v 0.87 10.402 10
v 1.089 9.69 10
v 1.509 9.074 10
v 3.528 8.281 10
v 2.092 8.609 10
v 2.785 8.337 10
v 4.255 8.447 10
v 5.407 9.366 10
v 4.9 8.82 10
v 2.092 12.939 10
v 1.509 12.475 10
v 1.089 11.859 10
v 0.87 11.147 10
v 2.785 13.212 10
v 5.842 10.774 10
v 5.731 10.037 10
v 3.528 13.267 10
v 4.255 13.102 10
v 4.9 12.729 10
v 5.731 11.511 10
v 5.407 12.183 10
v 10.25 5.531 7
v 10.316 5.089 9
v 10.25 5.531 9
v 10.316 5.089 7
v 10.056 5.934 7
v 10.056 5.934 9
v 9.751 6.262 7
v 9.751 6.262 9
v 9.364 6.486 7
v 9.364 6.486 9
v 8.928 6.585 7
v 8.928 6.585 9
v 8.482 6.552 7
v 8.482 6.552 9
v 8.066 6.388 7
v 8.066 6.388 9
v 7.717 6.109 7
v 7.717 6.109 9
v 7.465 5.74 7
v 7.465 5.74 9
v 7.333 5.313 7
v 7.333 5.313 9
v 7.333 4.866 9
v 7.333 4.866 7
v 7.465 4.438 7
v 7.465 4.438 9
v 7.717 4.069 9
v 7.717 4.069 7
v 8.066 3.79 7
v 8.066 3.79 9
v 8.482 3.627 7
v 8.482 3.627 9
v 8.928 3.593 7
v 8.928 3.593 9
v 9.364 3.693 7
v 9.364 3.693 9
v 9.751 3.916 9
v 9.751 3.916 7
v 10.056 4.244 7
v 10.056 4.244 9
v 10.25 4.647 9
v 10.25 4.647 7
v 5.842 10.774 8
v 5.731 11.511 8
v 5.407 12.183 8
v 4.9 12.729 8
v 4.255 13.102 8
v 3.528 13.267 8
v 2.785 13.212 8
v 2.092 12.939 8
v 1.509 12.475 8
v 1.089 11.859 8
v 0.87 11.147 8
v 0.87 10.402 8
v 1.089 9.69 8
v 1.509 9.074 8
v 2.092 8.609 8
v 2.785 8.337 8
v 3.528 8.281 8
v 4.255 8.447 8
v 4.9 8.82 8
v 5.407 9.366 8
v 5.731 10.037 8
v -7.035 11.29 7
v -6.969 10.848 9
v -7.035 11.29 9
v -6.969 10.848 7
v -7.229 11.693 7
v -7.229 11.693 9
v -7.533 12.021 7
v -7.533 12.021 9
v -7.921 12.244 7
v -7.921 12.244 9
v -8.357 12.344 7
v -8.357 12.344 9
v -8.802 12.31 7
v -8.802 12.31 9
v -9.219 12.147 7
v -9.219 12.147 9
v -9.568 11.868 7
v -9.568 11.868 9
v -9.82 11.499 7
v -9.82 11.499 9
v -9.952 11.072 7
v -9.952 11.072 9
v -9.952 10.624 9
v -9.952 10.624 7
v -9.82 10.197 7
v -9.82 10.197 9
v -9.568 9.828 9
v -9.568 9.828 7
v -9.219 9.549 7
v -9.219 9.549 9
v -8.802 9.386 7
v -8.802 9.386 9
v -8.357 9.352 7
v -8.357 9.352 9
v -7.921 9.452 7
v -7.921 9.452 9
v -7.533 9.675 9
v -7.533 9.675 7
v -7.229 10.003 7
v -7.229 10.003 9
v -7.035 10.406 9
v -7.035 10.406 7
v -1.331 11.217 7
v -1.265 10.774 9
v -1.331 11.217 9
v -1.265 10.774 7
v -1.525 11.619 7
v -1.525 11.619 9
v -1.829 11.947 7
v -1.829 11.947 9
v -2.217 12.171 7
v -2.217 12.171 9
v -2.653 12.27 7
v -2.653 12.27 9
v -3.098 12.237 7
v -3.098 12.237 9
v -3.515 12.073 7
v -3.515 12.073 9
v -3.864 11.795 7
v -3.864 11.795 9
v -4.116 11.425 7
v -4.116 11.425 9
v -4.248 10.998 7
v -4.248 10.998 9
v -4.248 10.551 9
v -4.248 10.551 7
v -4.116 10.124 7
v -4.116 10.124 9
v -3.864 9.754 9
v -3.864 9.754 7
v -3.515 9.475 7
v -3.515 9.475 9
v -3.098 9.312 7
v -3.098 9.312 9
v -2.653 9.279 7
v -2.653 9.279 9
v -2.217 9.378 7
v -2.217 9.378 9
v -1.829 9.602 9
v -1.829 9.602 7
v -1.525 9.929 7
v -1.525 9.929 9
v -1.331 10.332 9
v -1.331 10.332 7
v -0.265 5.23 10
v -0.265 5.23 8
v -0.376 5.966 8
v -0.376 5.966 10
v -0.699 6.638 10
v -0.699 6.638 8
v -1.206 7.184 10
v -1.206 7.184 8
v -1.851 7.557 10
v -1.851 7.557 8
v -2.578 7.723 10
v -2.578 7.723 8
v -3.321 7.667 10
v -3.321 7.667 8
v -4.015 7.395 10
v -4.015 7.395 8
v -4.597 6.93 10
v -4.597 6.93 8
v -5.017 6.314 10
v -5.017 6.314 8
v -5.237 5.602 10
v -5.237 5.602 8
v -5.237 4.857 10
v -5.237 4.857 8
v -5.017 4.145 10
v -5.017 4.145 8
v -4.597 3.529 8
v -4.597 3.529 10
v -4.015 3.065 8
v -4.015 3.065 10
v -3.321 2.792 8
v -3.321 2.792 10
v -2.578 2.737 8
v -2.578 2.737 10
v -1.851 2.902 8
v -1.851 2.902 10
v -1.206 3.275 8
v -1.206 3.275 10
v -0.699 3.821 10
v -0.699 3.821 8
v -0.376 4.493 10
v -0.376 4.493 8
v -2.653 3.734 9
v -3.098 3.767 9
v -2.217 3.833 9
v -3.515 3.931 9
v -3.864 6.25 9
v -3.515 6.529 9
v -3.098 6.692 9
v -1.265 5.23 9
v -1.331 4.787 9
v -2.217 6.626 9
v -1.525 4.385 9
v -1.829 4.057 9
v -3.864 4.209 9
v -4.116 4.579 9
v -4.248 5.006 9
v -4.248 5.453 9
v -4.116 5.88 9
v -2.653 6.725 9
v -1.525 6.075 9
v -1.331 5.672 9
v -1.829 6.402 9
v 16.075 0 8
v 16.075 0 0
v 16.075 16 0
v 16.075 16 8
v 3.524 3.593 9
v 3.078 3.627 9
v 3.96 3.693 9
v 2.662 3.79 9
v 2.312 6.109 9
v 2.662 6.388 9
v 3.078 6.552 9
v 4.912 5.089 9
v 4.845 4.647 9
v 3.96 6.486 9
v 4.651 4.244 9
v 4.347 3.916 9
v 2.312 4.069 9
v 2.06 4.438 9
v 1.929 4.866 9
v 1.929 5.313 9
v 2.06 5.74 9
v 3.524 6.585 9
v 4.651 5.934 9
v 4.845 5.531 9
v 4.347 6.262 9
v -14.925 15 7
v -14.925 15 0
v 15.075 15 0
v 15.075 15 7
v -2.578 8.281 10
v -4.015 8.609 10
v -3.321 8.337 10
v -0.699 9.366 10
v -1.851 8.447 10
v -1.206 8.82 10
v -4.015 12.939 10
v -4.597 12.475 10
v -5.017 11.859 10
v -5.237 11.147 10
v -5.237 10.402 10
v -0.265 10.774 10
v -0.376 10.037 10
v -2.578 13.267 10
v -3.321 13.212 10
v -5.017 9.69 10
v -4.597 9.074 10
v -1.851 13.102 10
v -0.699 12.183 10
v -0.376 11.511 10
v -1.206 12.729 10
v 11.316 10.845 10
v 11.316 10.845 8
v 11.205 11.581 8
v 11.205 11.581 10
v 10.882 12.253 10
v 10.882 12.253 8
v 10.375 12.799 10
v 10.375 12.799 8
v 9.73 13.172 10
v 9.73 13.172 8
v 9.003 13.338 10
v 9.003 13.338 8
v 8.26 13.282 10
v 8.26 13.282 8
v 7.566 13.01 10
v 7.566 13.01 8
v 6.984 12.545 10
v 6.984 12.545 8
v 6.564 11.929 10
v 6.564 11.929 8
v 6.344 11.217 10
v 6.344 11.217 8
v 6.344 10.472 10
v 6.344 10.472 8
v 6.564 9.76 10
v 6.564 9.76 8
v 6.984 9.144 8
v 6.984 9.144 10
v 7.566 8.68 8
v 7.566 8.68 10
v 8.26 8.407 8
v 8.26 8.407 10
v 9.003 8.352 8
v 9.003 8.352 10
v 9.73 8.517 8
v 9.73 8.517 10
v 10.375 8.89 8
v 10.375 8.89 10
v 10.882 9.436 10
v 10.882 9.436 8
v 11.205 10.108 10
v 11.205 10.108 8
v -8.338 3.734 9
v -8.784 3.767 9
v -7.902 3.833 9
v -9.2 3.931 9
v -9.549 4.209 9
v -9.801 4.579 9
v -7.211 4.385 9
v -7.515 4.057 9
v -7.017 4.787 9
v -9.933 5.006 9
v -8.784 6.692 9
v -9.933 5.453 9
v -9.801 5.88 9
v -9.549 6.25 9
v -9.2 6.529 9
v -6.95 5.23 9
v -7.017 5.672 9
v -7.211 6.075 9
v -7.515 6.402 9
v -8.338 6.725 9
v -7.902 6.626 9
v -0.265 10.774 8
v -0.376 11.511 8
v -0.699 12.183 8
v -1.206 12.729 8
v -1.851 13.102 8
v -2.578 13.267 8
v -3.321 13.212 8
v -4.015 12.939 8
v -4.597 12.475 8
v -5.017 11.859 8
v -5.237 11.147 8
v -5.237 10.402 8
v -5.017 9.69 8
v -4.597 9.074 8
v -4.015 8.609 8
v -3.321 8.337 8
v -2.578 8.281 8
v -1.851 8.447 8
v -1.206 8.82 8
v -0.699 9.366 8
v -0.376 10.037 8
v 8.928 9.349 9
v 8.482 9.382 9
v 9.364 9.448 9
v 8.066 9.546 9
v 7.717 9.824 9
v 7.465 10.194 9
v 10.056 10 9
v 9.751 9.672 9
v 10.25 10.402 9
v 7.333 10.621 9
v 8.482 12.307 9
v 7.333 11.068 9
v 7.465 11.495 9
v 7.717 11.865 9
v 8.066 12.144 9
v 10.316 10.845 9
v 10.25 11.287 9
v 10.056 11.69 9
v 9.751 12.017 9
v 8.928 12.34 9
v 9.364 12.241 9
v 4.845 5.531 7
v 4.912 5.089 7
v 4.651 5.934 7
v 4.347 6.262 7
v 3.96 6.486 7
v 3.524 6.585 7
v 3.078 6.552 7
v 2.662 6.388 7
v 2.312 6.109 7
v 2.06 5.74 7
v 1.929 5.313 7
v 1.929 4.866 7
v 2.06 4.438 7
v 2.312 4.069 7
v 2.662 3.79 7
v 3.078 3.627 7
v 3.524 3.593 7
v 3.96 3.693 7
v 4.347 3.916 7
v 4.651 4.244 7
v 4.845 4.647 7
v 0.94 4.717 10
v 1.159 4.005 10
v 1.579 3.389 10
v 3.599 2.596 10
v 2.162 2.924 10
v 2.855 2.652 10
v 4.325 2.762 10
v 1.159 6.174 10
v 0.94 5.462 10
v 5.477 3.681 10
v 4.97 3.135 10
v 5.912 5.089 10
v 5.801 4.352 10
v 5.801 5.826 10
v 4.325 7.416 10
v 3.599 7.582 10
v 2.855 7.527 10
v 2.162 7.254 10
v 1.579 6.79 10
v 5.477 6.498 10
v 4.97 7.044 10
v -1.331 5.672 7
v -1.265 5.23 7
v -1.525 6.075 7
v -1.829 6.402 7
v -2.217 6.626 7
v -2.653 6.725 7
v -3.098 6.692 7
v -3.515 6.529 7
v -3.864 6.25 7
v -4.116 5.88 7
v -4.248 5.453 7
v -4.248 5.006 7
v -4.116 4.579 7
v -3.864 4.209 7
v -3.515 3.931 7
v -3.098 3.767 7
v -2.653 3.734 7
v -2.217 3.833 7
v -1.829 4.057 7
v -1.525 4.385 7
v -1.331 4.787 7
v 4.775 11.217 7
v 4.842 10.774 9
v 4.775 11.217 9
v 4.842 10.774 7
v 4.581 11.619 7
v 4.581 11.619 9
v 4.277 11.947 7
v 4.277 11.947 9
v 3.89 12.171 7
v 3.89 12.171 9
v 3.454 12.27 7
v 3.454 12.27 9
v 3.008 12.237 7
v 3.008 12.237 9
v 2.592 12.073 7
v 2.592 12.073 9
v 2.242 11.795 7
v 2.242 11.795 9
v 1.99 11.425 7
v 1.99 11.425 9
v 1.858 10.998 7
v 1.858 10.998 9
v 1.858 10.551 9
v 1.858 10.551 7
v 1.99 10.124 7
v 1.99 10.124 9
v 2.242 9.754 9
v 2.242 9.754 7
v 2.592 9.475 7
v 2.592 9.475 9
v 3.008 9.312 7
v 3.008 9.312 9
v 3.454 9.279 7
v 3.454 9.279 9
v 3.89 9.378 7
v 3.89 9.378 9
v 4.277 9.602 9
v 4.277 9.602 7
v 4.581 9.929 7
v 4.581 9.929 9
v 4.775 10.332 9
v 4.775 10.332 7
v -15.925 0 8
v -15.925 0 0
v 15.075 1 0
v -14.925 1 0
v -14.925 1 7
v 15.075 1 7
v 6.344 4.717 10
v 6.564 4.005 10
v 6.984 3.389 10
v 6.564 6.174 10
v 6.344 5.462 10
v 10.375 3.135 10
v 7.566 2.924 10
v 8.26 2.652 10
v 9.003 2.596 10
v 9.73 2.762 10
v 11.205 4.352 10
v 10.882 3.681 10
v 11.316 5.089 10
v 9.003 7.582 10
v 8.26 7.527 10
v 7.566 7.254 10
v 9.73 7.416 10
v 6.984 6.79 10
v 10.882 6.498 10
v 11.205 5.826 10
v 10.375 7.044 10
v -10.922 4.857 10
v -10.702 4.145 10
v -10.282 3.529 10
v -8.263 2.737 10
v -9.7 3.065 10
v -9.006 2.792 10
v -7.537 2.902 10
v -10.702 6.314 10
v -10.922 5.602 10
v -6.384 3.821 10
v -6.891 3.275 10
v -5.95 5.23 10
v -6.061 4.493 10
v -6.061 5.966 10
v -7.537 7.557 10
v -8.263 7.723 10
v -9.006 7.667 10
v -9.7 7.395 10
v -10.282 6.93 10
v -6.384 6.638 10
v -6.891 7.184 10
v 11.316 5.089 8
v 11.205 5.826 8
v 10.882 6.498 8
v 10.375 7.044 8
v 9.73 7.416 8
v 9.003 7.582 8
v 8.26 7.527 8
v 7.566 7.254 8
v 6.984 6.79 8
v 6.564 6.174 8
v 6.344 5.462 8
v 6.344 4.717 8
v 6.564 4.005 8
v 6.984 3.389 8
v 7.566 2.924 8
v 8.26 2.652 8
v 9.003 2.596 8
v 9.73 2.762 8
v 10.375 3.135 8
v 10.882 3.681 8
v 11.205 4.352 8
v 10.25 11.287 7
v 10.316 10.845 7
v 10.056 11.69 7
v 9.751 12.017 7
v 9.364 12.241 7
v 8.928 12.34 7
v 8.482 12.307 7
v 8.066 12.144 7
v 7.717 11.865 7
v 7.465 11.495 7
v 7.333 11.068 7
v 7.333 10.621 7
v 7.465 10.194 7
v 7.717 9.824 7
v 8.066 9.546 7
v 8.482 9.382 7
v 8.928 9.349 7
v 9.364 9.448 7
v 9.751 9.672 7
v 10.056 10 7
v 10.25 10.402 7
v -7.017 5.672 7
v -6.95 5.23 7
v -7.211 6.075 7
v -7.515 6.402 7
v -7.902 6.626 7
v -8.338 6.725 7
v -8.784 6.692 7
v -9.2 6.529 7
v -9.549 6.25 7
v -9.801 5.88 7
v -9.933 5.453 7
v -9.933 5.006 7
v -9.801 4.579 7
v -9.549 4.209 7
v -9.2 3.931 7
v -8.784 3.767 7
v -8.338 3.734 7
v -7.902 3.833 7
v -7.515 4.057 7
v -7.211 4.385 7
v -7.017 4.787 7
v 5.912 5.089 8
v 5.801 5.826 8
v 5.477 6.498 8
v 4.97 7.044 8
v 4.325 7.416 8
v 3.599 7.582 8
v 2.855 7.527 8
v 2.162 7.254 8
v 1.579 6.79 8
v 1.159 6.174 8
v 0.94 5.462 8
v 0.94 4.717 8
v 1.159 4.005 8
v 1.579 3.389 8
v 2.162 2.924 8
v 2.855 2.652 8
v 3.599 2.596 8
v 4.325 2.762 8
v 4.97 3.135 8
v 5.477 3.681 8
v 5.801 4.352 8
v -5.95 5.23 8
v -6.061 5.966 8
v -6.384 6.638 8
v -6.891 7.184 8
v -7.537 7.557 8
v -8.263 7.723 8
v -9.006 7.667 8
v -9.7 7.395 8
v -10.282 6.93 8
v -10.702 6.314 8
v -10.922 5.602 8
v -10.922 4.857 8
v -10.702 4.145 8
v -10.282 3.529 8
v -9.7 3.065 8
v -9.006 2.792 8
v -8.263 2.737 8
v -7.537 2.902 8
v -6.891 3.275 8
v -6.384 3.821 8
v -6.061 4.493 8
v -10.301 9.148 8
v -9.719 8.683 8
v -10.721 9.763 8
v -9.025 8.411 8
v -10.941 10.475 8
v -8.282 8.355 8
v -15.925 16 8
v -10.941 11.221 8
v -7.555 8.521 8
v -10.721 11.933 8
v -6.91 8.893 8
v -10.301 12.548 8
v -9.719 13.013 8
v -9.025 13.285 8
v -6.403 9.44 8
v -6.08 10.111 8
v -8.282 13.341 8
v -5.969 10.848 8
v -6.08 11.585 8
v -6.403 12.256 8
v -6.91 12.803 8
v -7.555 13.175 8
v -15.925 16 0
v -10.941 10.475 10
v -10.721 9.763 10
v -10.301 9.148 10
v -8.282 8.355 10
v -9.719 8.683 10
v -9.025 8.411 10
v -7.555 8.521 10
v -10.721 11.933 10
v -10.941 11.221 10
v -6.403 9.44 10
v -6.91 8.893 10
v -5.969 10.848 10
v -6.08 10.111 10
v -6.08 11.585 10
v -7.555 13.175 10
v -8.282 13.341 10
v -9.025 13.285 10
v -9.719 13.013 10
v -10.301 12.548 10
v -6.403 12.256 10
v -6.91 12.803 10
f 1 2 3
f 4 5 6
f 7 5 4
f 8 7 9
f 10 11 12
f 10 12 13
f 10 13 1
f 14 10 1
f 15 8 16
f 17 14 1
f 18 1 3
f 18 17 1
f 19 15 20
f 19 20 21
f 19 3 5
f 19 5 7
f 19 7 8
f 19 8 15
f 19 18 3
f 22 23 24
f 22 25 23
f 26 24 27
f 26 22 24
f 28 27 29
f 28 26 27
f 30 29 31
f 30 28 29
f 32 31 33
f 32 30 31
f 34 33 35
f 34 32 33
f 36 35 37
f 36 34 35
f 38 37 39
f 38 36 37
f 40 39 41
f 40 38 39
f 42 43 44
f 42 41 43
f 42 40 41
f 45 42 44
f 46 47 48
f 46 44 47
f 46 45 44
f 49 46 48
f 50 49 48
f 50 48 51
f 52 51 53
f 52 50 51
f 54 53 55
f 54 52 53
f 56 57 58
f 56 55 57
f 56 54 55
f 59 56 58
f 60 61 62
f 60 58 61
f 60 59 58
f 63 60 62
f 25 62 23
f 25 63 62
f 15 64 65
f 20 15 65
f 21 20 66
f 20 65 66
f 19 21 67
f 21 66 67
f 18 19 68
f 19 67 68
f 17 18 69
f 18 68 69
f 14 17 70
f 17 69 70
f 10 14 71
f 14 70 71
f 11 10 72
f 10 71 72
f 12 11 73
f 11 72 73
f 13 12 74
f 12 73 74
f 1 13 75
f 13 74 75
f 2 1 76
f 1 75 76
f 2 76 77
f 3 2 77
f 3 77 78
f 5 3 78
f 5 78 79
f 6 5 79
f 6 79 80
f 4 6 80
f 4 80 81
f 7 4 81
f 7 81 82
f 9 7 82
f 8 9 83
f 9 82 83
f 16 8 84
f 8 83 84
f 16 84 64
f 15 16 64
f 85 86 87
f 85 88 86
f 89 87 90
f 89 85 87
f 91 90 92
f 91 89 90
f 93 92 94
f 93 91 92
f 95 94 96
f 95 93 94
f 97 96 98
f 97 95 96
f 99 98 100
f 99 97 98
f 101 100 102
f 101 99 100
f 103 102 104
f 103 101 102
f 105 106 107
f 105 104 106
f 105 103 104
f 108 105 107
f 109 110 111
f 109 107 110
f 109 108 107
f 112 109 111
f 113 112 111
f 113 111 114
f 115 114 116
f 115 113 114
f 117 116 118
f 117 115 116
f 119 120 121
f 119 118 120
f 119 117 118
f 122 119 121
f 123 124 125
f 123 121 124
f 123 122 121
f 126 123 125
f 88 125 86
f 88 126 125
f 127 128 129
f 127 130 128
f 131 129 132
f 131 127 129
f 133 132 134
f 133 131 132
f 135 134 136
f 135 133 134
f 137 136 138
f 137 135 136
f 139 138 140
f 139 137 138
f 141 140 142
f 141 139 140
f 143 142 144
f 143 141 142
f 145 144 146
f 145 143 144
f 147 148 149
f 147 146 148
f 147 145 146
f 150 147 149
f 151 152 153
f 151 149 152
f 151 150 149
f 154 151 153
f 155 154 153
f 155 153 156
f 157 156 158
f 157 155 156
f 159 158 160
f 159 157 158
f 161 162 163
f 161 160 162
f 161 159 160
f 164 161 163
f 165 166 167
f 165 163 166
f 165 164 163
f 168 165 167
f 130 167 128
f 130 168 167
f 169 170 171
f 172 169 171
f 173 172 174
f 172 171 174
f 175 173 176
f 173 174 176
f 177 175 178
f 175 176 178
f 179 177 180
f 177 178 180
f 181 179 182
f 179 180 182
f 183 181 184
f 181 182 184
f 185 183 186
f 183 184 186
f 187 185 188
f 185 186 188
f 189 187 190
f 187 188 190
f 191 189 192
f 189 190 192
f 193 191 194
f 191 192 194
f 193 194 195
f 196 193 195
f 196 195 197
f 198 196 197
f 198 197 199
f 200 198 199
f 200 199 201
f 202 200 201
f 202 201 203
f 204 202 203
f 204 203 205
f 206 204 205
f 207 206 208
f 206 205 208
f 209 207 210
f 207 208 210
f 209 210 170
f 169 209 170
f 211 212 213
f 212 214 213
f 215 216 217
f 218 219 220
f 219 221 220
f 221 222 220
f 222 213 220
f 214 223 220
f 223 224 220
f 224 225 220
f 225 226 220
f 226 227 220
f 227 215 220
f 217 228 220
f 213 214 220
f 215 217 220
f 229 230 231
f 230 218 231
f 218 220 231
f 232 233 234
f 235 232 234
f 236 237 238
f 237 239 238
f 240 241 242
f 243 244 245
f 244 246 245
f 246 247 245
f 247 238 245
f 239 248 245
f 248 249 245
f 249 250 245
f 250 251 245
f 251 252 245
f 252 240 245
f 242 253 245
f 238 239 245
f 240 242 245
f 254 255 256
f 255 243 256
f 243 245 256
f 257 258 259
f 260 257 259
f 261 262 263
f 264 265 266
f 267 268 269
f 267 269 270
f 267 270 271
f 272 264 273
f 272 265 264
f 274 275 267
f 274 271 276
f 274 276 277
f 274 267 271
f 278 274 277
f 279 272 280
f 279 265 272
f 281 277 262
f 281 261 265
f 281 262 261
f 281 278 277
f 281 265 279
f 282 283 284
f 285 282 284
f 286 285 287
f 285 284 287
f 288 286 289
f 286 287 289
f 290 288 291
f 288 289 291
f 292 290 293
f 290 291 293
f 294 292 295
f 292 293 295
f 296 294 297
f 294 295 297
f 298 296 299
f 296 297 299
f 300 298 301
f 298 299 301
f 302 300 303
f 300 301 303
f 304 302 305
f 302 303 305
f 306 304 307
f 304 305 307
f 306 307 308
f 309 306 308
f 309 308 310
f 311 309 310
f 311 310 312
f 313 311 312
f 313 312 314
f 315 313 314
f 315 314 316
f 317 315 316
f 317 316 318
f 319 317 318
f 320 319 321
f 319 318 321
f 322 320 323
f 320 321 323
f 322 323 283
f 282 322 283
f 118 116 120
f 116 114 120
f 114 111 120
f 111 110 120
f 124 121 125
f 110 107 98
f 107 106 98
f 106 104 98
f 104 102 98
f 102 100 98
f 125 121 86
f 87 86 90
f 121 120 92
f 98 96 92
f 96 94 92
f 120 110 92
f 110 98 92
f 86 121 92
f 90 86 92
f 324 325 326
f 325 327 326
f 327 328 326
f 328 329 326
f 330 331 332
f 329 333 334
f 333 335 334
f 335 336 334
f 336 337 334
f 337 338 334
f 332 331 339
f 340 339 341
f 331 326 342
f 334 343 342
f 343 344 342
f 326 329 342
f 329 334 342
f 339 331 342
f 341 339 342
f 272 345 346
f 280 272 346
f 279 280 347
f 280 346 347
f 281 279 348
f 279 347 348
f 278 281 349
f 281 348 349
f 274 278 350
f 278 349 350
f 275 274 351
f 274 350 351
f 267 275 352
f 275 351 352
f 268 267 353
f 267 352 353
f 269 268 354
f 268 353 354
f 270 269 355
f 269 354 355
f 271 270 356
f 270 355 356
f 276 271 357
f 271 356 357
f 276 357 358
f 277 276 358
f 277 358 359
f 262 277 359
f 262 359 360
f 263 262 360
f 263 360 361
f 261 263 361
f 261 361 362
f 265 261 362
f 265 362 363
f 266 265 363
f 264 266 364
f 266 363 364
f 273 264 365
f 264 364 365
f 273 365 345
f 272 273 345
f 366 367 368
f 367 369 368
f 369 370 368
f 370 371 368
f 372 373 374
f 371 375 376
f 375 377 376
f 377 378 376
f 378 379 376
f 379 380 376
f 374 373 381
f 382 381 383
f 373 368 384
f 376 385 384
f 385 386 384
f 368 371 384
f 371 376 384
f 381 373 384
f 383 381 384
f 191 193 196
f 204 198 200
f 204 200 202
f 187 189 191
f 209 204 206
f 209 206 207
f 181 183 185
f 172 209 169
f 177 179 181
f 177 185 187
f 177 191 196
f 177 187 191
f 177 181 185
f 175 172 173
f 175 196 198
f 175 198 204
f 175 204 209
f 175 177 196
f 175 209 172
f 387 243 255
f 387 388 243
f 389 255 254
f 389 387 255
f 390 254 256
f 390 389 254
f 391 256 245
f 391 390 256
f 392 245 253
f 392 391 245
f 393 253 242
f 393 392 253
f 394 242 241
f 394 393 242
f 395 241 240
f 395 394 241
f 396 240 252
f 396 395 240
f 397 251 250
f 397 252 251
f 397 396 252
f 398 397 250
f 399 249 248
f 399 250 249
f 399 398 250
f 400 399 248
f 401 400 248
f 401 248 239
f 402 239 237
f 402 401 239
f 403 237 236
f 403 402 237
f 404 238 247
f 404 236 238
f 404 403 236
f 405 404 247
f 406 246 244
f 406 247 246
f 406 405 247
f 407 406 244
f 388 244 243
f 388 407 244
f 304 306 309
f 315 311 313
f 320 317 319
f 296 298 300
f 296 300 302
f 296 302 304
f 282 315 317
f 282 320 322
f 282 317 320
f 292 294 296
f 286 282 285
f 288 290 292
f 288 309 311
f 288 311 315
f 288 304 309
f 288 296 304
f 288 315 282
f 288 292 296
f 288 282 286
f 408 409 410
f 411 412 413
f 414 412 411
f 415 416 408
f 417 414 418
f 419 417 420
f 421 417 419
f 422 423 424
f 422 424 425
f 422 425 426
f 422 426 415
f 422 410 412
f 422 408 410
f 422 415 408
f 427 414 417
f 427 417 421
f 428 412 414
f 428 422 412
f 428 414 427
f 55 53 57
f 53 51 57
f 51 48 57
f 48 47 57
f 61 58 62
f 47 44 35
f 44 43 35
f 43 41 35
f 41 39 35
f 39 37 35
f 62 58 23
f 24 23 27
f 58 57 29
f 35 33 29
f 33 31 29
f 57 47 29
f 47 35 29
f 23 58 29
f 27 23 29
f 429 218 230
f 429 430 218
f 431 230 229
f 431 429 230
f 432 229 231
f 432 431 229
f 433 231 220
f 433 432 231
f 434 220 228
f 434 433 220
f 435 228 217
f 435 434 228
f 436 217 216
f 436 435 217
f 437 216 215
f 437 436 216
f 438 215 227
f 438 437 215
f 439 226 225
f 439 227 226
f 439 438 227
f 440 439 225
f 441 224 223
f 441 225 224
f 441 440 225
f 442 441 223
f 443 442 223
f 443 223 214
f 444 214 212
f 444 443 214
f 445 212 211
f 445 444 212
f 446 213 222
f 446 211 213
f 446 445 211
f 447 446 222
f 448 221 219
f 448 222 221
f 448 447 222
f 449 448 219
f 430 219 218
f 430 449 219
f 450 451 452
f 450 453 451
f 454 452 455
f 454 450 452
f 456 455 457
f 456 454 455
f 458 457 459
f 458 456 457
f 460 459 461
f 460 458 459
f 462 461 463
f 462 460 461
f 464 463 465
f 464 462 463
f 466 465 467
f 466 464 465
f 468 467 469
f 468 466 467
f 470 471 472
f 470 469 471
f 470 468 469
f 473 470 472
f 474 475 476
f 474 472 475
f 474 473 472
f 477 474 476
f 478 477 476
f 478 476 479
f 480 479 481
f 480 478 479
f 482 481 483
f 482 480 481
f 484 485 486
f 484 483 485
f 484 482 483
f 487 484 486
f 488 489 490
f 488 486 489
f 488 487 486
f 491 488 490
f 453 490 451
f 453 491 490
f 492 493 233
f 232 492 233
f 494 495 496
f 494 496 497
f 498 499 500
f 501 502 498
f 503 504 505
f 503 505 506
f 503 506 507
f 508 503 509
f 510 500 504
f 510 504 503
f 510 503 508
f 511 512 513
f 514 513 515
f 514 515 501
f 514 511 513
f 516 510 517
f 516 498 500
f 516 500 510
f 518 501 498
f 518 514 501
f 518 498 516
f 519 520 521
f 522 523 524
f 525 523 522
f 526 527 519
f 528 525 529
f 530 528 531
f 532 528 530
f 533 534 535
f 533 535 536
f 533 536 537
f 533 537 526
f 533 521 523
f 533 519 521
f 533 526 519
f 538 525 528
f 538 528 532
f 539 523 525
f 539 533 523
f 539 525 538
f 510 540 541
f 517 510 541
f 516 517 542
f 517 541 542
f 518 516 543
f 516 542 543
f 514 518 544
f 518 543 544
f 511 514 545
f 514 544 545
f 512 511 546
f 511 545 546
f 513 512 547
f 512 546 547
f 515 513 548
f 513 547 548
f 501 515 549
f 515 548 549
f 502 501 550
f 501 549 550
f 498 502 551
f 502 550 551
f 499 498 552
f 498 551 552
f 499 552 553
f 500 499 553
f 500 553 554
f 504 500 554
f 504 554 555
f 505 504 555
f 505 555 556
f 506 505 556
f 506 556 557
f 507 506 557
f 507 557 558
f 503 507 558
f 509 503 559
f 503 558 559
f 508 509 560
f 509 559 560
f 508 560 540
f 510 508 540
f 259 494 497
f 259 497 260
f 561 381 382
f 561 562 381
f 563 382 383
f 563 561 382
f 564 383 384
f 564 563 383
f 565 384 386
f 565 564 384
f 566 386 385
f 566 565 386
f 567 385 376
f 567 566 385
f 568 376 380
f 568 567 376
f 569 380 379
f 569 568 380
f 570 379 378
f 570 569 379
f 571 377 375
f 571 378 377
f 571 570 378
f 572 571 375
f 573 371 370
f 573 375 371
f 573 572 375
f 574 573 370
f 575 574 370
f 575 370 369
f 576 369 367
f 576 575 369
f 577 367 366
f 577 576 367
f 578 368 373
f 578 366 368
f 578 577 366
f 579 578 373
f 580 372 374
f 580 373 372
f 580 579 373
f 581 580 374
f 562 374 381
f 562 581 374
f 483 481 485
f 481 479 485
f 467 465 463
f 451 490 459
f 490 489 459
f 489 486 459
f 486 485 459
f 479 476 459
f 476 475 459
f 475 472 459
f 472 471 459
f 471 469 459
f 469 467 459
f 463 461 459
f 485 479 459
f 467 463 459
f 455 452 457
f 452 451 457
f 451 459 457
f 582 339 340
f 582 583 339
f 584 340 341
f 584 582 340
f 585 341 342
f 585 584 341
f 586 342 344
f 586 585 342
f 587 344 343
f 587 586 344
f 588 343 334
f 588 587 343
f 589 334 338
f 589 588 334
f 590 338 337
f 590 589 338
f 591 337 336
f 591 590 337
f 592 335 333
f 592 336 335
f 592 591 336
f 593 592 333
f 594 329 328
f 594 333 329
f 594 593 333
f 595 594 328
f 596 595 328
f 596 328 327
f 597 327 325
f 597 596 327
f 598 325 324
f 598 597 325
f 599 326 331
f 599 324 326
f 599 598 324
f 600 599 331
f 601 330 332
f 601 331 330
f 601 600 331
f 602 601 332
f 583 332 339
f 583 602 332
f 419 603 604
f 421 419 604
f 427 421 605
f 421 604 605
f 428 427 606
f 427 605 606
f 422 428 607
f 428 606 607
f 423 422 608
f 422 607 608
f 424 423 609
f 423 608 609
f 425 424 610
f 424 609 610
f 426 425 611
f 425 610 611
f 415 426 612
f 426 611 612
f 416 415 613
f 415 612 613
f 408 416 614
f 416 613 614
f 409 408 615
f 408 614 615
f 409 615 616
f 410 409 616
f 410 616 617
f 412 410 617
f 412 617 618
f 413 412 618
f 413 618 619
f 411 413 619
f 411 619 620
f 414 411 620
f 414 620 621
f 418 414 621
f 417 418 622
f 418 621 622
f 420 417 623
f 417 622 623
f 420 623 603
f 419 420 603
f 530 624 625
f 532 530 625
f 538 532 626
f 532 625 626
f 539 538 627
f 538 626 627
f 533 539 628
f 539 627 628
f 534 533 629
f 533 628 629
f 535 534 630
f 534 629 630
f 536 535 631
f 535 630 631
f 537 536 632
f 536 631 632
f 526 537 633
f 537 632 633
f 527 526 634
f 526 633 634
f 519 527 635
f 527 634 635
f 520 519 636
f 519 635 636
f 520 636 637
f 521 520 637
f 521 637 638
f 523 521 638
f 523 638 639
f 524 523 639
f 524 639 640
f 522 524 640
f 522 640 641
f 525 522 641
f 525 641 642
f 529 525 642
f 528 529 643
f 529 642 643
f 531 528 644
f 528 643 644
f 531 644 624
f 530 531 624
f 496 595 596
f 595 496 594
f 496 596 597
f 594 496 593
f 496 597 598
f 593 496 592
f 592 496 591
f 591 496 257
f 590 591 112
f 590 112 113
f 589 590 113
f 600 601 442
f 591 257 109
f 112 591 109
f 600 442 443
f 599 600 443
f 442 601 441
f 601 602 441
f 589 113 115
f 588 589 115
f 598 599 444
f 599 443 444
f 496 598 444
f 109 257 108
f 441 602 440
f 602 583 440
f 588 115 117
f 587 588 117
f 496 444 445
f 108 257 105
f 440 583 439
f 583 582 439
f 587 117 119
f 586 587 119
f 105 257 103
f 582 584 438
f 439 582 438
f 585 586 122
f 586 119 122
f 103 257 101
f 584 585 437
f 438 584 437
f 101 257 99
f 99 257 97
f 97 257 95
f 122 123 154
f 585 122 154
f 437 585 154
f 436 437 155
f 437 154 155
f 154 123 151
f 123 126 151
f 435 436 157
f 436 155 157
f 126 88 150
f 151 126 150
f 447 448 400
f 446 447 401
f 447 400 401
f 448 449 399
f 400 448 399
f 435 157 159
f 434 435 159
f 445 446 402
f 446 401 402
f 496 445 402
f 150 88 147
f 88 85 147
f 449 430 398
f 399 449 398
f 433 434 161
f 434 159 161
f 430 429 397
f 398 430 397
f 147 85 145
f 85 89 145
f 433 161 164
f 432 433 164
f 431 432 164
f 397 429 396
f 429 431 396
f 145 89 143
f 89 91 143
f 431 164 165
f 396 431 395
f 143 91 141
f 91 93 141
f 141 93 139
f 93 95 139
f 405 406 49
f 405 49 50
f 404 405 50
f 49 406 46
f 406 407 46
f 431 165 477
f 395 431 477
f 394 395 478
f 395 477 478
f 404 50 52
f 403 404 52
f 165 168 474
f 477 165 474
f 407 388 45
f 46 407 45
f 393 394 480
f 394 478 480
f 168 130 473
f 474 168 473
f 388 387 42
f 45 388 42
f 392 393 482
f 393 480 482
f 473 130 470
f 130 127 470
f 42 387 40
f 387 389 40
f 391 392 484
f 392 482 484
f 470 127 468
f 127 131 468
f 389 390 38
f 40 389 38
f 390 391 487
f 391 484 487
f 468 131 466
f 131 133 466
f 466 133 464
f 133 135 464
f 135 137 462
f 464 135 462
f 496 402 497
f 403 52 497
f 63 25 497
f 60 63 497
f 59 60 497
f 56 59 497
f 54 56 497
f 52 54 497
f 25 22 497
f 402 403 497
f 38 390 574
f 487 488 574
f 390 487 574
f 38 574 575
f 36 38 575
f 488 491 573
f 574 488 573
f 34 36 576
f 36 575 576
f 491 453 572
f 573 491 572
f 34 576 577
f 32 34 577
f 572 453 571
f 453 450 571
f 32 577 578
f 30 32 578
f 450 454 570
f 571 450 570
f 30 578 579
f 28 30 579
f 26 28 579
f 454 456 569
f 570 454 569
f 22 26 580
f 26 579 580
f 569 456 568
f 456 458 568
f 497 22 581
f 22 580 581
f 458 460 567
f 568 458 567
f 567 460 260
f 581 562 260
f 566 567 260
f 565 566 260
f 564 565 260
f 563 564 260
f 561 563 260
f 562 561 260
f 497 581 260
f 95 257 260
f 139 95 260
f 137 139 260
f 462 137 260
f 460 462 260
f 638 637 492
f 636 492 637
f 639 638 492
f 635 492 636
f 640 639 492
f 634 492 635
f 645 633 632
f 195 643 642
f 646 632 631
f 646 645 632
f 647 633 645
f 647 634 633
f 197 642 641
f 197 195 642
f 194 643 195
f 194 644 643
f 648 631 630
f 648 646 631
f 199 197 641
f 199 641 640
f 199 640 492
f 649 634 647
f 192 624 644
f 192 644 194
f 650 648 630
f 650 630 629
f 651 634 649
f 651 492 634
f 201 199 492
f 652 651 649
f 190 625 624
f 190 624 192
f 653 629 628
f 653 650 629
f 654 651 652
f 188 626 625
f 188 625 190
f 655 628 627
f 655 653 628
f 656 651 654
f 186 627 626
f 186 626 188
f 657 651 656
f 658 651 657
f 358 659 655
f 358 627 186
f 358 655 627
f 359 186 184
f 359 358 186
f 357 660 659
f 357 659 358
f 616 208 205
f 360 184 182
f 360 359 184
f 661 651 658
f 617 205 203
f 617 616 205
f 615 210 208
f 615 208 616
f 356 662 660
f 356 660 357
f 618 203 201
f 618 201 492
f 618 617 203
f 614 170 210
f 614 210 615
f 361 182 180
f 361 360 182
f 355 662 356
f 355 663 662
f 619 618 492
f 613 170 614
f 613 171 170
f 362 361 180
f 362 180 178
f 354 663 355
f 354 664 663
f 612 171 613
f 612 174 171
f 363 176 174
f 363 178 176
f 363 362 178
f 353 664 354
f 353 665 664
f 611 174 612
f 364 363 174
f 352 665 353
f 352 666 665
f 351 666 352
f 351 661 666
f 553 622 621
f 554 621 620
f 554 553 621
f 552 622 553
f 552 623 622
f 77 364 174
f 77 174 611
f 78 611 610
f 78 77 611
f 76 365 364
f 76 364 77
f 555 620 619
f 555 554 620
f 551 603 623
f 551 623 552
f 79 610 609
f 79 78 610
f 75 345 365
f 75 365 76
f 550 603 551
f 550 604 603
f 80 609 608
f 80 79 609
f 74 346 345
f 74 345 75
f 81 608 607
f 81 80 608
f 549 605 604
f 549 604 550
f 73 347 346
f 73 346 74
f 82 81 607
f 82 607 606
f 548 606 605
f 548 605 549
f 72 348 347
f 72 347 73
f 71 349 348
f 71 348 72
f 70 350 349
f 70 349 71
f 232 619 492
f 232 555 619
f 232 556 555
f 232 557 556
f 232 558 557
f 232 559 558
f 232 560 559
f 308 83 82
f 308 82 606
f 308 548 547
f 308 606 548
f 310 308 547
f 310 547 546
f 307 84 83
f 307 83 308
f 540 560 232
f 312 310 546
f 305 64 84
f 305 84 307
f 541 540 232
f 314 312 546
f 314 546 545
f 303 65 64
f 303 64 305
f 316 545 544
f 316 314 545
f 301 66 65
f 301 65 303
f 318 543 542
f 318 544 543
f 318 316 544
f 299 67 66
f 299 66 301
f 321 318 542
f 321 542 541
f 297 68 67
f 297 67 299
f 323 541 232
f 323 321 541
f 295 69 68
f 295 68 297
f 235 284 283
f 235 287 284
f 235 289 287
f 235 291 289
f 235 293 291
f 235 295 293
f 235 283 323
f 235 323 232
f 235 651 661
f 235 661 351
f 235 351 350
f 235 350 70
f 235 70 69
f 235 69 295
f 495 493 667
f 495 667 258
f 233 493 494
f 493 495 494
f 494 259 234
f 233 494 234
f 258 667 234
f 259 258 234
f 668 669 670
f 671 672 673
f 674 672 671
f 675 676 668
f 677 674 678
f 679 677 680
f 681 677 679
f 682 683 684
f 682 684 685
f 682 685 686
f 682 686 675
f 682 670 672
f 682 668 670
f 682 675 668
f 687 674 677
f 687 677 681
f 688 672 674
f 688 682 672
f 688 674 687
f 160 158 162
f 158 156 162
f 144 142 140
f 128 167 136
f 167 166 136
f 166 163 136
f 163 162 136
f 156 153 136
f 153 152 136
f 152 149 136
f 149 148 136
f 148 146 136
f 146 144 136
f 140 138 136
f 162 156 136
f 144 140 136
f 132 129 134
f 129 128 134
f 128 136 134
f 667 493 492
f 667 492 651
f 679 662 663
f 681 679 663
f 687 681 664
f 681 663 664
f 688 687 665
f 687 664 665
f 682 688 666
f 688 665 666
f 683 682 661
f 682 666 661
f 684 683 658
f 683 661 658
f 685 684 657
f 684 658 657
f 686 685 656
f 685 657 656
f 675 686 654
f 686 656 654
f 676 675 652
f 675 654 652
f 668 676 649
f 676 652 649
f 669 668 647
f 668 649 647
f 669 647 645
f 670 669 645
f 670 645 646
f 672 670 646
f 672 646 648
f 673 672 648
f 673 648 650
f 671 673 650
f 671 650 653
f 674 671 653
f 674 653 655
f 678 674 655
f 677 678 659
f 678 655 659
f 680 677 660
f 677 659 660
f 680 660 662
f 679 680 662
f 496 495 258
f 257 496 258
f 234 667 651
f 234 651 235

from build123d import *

# Parameters (mm, degrees)
F0_W     = 32
F0_H     = 16
F1_DEPTH = 8
F3_R     = 2.5
F4_DEPTH = 2
F5_T     = -1


# Not quite as in the source:
# - the program builds the solid bodies; features that only make, move or delete a surface that nothing else refers to are left out


with BuildPart() as f1:
    # F0 (on Top) → F1 (new body)
    with BuildSketch(Plane.XY):
        with Locations((0.0749295065, 8)):
            Rectangle(F0_W, F0_H)
    extrude(amount=F1_DEPTH)

    # F3 (on offset) → F4 (join)
    with BuildSketch(Plane.XY.offset(8)):
        with Locations((-8.4686602995, 10.8479883277)):
            Circle(F3_R)
        with Locations((-2.7646990493, 10.774385184)):
            Circle(F3_R)
        with Locations((3.3415844664, 10.774385184)):
            Circle(F3_R)
        with Locations((8.8161835447, 10.8445733786)):
            Circle(F3_R)
        with Locations((8.8161835447, 5.0892247818)):
            Circle(F3_R)
        with Locations((3.4117714968, 5.0892247818)):
            Circle(F3_R)
        with Locations((-2.7646990493, 5.2295993082)):
            Circle(F3_R)
        with Locations((-8.4498599172, 5.2295993082)):
            Circle(F3_R)
    extrude(amount=F4_DEPTH)

    # F5
    f5_openings = [f1.faces().sort_by_distance(p)[0] for p in [
        (0.07493, 8, 0),
    ]]
    offset(amount=F5_T, openings=f5_openings, kind=Kind.INTERSECTION)


solid = f1.part
